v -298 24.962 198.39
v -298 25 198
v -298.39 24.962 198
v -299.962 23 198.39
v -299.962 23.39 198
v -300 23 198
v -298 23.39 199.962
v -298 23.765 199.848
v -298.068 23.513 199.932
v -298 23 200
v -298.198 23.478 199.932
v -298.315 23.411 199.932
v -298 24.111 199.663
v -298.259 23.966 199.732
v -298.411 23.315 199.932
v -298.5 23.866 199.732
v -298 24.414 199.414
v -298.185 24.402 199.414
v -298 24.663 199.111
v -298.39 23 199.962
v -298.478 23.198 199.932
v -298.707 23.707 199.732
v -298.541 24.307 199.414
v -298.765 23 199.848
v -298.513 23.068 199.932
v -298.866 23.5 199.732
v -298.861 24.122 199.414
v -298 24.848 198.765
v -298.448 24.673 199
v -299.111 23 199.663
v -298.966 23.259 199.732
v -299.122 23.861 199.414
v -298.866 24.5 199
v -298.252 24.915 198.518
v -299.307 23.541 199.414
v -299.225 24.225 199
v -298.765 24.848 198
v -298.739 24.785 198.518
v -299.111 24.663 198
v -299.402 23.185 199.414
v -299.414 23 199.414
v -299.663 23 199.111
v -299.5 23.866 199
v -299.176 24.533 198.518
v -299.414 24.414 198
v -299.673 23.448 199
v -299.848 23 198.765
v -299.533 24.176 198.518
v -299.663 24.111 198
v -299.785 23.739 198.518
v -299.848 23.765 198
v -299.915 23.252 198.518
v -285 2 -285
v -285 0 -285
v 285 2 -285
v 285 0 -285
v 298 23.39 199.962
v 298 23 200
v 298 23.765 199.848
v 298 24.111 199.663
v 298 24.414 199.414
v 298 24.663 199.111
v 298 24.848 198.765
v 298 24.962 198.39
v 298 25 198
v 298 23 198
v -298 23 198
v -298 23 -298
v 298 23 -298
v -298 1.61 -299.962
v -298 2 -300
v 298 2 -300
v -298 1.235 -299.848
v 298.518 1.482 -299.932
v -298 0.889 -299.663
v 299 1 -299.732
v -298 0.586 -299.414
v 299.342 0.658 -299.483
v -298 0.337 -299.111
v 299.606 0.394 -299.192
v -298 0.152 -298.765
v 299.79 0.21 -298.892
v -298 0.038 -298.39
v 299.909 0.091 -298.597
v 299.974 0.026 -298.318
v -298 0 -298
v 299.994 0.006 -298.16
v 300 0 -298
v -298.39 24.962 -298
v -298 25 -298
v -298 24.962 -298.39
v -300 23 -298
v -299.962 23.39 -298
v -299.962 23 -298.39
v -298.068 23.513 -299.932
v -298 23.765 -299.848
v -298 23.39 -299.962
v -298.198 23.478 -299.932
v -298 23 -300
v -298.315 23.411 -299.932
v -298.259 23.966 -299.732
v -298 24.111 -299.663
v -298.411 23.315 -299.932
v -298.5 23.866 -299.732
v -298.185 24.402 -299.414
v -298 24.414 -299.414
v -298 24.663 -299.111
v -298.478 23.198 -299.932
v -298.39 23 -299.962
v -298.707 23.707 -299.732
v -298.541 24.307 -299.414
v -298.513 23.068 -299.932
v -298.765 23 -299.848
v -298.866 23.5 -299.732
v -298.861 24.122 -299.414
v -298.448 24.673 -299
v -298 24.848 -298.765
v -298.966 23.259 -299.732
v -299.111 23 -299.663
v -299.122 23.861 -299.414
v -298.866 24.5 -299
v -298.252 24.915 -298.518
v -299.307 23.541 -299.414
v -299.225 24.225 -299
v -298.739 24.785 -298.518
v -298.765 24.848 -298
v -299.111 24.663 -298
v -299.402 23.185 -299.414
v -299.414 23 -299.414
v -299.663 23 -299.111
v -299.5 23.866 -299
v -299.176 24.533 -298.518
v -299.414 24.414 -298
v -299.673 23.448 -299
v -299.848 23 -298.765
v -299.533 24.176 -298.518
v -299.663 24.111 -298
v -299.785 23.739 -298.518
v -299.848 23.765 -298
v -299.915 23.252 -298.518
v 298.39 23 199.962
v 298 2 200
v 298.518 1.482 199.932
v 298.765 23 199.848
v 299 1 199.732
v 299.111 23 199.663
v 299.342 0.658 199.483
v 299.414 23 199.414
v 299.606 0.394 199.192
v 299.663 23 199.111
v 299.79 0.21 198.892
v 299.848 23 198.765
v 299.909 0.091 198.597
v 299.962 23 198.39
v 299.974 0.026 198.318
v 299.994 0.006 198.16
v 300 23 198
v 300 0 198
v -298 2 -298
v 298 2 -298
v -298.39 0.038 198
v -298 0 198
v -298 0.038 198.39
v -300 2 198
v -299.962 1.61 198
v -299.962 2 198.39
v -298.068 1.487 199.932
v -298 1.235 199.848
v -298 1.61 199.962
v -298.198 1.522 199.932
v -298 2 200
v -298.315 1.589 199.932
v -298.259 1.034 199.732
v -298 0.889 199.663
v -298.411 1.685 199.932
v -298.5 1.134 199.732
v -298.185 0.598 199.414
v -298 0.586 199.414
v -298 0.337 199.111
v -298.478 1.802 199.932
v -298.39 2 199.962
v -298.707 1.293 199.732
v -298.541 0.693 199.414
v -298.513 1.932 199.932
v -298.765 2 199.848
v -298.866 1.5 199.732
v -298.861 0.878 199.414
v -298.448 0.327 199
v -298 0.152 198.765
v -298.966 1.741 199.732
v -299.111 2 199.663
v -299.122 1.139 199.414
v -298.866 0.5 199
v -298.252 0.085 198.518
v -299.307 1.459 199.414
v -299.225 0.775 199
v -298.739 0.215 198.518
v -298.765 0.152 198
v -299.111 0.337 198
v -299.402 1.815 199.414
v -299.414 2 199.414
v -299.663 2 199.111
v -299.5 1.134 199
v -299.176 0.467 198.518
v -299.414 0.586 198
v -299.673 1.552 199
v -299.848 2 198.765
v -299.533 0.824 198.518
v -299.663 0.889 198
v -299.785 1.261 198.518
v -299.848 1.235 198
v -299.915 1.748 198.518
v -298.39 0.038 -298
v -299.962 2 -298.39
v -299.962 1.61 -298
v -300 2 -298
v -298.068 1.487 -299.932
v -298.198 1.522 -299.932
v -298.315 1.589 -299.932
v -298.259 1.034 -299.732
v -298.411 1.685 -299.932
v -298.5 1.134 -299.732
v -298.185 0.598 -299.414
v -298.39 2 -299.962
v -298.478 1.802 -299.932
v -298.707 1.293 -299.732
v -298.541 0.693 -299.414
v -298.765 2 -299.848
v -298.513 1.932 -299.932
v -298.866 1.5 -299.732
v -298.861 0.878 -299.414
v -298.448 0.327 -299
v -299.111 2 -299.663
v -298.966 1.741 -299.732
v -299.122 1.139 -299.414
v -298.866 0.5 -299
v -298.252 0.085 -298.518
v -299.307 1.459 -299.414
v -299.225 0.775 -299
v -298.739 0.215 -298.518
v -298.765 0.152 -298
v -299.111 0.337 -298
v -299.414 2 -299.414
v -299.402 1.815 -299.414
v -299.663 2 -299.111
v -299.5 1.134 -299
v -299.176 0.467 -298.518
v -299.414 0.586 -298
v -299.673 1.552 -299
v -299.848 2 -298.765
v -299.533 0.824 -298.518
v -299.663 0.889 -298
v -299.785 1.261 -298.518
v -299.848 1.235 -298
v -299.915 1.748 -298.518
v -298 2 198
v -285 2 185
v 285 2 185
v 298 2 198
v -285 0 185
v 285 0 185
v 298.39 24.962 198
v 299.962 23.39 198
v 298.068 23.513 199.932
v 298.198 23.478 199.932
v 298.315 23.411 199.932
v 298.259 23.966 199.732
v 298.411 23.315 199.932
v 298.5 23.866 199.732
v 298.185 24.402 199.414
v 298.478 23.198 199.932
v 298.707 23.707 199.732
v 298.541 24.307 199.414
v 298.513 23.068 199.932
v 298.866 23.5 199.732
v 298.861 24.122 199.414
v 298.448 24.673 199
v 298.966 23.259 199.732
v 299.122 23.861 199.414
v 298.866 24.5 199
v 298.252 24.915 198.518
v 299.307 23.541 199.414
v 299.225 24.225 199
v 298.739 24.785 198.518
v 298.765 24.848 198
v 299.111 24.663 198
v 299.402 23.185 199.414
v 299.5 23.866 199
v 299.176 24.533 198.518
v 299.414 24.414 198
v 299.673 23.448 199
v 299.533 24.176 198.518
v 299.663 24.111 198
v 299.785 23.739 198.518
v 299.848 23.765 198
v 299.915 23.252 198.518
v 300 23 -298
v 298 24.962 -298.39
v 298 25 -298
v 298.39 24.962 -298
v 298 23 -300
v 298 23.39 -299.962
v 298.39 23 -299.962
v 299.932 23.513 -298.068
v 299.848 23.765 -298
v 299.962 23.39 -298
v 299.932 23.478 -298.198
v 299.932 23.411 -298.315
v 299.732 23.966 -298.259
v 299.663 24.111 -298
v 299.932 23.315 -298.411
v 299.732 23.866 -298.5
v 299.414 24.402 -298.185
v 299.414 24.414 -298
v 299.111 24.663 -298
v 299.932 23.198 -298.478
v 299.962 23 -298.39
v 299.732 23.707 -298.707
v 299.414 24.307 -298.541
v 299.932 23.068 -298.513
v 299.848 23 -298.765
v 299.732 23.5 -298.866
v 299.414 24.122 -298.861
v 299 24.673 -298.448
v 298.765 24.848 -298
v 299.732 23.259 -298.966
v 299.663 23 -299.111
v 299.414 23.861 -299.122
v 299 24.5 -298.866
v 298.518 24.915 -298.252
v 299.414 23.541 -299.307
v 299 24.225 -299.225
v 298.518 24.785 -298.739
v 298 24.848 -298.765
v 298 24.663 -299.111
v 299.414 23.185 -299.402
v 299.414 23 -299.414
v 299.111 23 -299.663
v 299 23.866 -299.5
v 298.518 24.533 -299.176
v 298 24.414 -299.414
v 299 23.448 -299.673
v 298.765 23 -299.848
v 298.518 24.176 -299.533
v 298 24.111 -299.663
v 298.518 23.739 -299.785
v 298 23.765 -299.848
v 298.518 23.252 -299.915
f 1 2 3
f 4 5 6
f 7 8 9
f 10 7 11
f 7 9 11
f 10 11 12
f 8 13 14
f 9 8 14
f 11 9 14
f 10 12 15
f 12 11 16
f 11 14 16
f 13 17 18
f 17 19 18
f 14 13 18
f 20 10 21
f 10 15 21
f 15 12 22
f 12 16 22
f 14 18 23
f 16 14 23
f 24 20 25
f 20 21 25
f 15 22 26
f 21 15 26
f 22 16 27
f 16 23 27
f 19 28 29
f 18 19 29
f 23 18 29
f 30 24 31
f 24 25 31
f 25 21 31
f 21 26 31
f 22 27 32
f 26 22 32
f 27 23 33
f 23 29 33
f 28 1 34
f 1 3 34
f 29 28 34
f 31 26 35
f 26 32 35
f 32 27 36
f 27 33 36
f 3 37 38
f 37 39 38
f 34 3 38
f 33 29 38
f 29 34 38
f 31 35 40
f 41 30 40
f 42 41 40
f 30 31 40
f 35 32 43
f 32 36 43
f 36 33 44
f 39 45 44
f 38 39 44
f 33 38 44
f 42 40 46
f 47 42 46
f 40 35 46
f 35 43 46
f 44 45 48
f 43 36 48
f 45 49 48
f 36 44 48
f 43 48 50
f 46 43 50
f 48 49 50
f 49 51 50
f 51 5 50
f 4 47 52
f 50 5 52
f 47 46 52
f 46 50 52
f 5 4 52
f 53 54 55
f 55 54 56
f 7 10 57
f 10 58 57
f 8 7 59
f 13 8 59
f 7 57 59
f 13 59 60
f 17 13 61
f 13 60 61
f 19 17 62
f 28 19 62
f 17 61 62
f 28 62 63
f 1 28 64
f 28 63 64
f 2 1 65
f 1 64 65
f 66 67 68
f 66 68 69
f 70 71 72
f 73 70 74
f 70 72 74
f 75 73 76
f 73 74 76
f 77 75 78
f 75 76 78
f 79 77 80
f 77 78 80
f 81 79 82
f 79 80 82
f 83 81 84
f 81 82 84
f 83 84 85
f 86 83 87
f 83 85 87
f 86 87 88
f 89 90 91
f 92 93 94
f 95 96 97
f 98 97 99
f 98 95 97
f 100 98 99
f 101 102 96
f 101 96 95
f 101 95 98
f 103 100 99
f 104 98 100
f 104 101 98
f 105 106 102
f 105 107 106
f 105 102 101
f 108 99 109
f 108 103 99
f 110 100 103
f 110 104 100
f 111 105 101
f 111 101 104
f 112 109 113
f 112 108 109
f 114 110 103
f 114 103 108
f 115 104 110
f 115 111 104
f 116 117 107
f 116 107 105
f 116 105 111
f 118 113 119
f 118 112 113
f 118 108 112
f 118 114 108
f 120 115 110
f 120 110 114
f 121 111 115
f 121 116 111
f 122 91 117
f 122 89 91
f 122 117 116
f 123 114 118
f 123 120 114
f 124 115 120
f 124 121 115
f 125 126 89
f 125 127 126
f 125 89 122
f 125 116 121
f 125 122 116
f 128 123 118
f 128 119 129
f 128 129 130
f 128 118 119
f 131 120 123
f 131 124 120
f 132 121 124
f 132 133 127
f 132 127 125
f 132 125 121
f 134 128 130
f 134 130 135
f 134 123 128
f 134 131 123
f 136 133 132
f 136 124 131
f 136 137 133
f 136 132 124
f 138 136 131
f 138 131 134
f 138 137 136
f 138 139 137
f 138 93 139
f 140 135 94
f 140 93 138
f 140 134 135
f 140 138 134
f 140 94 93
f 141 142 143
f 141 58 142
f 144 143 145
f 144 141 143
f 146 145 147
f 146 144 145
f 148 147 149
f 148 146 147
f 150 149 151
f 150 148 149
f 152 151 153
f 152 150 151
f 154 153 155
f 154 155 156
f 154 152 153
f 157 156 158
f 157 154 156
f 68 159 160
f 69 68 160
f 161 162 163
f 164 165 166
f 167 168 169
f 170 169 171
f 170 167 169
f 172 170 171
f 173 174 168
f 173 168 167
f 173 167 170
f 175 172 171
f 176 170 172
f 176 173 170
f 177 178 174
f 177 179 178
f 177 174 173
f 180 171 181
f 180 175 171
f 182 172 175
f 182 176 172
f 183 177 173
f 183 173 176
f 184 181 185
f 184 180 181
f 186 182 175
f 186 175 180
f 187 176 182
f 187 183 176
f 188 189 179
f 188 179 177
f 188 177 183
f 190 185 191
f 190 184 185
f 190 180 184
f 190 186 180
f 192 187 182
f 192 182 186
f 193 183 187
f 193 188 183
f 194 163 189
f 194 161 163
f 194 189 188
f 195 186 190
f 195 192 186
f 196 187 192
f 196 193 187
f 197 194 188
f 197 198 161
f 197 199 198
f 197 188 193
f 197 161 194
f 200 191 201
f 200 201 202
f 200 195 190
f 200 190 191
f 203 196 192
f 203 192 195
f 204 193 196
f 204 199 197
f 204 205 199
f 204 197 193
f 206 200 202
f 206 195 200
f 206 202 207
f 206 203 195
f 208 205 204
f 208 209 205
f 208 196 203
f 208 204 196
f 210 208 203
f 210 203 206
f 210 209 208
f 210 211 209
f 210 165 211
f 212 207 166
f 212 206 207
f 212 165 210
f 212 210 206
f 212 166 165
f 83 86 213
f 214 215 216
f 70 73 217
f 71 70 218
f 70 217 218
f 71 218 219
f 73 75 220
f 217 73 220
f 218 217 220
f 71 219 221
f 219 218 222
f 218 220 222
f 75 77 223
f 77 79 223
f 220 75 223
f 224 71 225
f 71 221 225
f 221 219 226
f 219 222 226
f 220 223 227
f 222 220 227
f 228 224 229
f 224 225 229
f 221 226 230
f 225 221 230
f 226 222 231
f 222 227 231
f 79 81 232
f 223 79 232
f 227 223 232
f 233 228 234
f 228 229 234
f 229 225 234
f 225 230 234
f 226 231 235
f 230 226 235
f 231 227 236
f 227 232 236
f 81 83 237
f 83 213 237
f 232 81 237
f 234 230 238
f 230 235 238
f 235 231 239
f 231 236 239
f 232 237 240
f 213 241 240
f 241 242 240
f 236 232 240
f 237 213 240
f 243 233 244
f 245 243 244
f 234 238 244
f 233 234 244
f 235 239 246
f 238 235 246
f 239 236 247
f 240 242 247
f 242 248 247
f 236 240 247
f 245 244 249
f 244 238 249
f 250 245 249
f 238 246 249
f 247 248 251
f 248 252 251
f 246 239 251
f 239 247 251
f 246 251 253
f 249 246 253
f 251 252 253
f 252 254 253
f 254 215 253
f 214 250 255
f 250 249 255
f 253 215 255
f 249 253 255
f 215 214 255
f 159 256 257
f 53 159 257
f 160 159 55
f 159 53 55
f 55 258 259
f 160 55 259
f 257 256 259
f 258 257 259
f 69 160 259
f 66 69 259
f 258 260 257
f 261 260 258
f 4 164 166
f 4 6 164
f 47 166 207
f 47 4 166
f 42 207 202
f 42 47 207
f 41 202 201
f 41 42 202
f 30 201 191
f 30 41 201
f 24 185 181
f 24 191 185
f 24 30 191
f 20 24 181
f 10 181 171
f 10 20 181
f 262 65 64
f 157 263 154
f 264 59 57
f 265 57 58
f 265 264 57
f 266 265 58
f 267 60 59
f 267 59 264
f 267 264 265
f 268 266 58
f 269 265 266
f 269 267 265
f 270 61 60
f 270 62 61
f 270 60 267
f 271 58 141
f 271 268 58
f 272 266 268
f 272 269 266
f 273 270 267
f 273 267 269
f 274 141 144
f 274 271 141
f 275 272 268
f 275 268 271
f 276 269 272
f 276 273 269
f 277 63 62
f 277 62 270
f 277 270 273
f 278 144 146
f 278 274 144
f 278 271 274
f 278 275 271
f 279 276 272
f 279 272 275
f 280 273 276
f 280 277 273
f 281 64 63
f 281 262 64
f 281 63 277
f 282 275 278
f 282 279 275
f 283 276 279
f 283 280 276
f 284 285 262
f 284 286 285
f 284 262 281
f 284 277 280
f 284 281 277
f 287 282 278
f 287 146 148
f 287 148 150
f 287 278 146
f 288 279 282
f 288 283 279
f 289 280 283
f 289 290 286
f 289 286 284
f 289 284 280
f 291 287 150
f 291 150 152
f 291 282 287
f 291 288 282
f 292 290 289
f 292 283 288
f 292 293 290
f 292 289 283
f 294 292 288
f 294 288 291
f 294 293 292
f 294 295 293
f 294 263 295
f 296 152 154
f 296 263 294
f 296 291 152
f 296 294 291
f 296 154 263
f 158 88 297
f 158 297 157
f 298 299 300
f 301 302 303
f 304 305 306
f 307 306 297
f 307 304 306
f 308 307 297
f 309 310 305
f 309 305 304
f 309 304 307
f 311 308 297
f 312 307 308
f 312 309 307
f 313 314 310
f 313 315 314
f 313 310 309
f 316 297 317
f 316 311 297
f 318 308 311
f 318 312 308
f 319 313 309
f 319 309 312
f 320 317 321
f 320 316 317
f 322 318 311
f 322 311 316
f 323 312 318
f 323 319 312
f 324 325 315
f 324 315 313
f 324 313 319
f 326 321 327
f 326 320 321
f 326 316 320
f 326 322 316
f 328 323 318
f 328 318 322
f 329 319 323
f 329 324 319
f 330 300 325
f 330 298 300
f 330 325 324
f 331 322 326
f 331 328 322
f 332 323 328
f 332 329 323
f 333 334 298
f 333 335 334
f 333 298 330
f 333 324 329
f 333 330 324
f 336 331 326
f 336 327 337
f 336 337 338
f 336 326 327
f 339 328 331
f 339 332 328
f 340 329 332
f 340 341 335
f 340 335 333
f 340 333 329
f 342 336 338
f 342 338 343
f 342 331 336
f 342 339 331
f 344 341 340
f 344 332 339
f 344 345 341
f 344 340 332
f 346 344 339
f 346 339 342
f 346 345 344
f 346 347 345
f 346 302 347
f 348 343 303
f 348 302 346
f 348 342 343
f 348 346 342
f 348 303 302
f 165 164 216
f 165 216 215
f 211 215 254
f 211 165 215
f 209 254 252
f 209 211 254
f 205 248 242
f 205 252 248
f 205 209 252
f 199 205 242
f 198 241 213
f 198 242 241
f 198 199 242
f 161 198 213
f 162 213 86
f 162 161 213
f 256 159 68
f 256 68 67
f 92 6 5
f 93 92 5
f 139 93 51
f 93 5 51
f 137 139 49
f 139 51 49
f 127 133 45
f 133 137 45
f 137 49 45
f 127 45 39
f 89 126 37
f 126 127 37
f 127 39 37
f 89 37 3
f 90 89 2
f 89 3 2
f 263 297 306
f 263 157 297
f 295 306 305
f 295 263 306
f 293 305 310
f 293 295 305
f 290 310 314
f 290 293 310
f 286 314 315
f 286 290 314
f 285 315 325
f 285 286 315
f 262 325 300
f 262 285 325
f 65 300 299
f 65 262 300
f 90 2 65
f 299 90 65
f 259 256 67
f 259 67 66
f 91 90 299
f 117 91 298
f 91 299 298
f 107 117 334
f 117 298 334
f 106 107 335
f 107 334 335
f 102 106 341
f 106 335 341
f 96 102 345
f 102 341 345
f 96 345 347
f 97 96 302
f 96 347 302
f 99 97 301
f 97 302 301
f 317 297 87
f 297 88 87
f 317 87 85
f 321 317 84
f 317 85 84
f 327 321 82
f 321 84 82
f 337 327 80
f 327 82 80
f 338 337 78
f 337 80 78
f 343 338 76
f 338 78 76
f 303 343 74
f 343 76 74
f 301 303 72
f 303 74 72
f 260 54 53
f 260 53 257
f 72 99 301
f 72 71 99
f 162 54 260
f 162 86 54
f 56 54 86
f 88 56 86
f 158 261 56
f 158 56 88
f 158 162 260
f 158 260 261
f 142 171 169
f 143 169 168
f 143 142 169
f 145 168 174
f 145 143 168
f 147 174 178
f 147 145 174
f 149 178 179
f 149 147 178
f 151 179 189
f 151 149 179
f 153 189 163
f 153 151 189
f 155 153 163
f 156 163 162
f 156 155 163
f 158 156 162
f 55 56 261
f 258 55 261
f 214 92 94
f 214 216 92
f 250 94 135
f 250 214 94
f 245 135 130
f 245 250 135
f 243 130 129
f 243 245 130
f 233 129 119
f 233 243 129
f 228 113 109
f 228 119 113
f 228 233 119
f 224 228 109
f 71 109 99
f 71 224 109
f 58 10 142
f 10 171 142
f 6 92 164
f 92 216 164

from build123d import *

# Parameters (mm, degrees)
F0_W     = 600
F0_H     = 500
F1_DEPTH = 25
F2_T     = -2
F3_W     = 600
F3_H     = 500
F3_W_2   = 570
F3_H_2   = 470
F4_DEPTH = 2
F5_R     = 2


with BuildPart() as f1:
    # F0 (on Front) → F1 (new body)
    with BuildSketch(Plane.XZ):
        with Locations((0, -50)):
            Rectangle(F0_W, F0_H)
    extrude(amount=-F1_DEPTH)

    # F2
    f2_openings = [f1.faces().sort_by_distance(p)[0] for p in [
        (0, 0, -50),
    ]]
    offset(amount=F2_T, openings=f2_openings)

    # F3 (on Front) → F4 (join)
    with BuildSketch(Plane.XZ):
        with Locations((0, -50)):
            Rectangle(F3_W, F3_H)
        with Locations((0, -50)):
            Rectangle(F3_W_2, F3_H_2, mode=Mode.SUBTRACT)
    extrude(amount=-F4_DEPTH)

    # F5
    f5_edges = [f1.edges().sort_by_distance(p)[0] for p in [
        (-300, 25, -50),
        (0, 25, -300),
        (300, 25, -50),
        (0, 25, 200),
        (-300, 0, -50),
        (0, 0, 200),
        (0, 0, -300),
        (300, 12.5, -300),
        (300, 12.5, 200),
        (-300, 12.5, 200),
        (-300, 12.5, -300),
    ]]
    fillet(f5_edges, radius=F5_R)


solid = f1.part
